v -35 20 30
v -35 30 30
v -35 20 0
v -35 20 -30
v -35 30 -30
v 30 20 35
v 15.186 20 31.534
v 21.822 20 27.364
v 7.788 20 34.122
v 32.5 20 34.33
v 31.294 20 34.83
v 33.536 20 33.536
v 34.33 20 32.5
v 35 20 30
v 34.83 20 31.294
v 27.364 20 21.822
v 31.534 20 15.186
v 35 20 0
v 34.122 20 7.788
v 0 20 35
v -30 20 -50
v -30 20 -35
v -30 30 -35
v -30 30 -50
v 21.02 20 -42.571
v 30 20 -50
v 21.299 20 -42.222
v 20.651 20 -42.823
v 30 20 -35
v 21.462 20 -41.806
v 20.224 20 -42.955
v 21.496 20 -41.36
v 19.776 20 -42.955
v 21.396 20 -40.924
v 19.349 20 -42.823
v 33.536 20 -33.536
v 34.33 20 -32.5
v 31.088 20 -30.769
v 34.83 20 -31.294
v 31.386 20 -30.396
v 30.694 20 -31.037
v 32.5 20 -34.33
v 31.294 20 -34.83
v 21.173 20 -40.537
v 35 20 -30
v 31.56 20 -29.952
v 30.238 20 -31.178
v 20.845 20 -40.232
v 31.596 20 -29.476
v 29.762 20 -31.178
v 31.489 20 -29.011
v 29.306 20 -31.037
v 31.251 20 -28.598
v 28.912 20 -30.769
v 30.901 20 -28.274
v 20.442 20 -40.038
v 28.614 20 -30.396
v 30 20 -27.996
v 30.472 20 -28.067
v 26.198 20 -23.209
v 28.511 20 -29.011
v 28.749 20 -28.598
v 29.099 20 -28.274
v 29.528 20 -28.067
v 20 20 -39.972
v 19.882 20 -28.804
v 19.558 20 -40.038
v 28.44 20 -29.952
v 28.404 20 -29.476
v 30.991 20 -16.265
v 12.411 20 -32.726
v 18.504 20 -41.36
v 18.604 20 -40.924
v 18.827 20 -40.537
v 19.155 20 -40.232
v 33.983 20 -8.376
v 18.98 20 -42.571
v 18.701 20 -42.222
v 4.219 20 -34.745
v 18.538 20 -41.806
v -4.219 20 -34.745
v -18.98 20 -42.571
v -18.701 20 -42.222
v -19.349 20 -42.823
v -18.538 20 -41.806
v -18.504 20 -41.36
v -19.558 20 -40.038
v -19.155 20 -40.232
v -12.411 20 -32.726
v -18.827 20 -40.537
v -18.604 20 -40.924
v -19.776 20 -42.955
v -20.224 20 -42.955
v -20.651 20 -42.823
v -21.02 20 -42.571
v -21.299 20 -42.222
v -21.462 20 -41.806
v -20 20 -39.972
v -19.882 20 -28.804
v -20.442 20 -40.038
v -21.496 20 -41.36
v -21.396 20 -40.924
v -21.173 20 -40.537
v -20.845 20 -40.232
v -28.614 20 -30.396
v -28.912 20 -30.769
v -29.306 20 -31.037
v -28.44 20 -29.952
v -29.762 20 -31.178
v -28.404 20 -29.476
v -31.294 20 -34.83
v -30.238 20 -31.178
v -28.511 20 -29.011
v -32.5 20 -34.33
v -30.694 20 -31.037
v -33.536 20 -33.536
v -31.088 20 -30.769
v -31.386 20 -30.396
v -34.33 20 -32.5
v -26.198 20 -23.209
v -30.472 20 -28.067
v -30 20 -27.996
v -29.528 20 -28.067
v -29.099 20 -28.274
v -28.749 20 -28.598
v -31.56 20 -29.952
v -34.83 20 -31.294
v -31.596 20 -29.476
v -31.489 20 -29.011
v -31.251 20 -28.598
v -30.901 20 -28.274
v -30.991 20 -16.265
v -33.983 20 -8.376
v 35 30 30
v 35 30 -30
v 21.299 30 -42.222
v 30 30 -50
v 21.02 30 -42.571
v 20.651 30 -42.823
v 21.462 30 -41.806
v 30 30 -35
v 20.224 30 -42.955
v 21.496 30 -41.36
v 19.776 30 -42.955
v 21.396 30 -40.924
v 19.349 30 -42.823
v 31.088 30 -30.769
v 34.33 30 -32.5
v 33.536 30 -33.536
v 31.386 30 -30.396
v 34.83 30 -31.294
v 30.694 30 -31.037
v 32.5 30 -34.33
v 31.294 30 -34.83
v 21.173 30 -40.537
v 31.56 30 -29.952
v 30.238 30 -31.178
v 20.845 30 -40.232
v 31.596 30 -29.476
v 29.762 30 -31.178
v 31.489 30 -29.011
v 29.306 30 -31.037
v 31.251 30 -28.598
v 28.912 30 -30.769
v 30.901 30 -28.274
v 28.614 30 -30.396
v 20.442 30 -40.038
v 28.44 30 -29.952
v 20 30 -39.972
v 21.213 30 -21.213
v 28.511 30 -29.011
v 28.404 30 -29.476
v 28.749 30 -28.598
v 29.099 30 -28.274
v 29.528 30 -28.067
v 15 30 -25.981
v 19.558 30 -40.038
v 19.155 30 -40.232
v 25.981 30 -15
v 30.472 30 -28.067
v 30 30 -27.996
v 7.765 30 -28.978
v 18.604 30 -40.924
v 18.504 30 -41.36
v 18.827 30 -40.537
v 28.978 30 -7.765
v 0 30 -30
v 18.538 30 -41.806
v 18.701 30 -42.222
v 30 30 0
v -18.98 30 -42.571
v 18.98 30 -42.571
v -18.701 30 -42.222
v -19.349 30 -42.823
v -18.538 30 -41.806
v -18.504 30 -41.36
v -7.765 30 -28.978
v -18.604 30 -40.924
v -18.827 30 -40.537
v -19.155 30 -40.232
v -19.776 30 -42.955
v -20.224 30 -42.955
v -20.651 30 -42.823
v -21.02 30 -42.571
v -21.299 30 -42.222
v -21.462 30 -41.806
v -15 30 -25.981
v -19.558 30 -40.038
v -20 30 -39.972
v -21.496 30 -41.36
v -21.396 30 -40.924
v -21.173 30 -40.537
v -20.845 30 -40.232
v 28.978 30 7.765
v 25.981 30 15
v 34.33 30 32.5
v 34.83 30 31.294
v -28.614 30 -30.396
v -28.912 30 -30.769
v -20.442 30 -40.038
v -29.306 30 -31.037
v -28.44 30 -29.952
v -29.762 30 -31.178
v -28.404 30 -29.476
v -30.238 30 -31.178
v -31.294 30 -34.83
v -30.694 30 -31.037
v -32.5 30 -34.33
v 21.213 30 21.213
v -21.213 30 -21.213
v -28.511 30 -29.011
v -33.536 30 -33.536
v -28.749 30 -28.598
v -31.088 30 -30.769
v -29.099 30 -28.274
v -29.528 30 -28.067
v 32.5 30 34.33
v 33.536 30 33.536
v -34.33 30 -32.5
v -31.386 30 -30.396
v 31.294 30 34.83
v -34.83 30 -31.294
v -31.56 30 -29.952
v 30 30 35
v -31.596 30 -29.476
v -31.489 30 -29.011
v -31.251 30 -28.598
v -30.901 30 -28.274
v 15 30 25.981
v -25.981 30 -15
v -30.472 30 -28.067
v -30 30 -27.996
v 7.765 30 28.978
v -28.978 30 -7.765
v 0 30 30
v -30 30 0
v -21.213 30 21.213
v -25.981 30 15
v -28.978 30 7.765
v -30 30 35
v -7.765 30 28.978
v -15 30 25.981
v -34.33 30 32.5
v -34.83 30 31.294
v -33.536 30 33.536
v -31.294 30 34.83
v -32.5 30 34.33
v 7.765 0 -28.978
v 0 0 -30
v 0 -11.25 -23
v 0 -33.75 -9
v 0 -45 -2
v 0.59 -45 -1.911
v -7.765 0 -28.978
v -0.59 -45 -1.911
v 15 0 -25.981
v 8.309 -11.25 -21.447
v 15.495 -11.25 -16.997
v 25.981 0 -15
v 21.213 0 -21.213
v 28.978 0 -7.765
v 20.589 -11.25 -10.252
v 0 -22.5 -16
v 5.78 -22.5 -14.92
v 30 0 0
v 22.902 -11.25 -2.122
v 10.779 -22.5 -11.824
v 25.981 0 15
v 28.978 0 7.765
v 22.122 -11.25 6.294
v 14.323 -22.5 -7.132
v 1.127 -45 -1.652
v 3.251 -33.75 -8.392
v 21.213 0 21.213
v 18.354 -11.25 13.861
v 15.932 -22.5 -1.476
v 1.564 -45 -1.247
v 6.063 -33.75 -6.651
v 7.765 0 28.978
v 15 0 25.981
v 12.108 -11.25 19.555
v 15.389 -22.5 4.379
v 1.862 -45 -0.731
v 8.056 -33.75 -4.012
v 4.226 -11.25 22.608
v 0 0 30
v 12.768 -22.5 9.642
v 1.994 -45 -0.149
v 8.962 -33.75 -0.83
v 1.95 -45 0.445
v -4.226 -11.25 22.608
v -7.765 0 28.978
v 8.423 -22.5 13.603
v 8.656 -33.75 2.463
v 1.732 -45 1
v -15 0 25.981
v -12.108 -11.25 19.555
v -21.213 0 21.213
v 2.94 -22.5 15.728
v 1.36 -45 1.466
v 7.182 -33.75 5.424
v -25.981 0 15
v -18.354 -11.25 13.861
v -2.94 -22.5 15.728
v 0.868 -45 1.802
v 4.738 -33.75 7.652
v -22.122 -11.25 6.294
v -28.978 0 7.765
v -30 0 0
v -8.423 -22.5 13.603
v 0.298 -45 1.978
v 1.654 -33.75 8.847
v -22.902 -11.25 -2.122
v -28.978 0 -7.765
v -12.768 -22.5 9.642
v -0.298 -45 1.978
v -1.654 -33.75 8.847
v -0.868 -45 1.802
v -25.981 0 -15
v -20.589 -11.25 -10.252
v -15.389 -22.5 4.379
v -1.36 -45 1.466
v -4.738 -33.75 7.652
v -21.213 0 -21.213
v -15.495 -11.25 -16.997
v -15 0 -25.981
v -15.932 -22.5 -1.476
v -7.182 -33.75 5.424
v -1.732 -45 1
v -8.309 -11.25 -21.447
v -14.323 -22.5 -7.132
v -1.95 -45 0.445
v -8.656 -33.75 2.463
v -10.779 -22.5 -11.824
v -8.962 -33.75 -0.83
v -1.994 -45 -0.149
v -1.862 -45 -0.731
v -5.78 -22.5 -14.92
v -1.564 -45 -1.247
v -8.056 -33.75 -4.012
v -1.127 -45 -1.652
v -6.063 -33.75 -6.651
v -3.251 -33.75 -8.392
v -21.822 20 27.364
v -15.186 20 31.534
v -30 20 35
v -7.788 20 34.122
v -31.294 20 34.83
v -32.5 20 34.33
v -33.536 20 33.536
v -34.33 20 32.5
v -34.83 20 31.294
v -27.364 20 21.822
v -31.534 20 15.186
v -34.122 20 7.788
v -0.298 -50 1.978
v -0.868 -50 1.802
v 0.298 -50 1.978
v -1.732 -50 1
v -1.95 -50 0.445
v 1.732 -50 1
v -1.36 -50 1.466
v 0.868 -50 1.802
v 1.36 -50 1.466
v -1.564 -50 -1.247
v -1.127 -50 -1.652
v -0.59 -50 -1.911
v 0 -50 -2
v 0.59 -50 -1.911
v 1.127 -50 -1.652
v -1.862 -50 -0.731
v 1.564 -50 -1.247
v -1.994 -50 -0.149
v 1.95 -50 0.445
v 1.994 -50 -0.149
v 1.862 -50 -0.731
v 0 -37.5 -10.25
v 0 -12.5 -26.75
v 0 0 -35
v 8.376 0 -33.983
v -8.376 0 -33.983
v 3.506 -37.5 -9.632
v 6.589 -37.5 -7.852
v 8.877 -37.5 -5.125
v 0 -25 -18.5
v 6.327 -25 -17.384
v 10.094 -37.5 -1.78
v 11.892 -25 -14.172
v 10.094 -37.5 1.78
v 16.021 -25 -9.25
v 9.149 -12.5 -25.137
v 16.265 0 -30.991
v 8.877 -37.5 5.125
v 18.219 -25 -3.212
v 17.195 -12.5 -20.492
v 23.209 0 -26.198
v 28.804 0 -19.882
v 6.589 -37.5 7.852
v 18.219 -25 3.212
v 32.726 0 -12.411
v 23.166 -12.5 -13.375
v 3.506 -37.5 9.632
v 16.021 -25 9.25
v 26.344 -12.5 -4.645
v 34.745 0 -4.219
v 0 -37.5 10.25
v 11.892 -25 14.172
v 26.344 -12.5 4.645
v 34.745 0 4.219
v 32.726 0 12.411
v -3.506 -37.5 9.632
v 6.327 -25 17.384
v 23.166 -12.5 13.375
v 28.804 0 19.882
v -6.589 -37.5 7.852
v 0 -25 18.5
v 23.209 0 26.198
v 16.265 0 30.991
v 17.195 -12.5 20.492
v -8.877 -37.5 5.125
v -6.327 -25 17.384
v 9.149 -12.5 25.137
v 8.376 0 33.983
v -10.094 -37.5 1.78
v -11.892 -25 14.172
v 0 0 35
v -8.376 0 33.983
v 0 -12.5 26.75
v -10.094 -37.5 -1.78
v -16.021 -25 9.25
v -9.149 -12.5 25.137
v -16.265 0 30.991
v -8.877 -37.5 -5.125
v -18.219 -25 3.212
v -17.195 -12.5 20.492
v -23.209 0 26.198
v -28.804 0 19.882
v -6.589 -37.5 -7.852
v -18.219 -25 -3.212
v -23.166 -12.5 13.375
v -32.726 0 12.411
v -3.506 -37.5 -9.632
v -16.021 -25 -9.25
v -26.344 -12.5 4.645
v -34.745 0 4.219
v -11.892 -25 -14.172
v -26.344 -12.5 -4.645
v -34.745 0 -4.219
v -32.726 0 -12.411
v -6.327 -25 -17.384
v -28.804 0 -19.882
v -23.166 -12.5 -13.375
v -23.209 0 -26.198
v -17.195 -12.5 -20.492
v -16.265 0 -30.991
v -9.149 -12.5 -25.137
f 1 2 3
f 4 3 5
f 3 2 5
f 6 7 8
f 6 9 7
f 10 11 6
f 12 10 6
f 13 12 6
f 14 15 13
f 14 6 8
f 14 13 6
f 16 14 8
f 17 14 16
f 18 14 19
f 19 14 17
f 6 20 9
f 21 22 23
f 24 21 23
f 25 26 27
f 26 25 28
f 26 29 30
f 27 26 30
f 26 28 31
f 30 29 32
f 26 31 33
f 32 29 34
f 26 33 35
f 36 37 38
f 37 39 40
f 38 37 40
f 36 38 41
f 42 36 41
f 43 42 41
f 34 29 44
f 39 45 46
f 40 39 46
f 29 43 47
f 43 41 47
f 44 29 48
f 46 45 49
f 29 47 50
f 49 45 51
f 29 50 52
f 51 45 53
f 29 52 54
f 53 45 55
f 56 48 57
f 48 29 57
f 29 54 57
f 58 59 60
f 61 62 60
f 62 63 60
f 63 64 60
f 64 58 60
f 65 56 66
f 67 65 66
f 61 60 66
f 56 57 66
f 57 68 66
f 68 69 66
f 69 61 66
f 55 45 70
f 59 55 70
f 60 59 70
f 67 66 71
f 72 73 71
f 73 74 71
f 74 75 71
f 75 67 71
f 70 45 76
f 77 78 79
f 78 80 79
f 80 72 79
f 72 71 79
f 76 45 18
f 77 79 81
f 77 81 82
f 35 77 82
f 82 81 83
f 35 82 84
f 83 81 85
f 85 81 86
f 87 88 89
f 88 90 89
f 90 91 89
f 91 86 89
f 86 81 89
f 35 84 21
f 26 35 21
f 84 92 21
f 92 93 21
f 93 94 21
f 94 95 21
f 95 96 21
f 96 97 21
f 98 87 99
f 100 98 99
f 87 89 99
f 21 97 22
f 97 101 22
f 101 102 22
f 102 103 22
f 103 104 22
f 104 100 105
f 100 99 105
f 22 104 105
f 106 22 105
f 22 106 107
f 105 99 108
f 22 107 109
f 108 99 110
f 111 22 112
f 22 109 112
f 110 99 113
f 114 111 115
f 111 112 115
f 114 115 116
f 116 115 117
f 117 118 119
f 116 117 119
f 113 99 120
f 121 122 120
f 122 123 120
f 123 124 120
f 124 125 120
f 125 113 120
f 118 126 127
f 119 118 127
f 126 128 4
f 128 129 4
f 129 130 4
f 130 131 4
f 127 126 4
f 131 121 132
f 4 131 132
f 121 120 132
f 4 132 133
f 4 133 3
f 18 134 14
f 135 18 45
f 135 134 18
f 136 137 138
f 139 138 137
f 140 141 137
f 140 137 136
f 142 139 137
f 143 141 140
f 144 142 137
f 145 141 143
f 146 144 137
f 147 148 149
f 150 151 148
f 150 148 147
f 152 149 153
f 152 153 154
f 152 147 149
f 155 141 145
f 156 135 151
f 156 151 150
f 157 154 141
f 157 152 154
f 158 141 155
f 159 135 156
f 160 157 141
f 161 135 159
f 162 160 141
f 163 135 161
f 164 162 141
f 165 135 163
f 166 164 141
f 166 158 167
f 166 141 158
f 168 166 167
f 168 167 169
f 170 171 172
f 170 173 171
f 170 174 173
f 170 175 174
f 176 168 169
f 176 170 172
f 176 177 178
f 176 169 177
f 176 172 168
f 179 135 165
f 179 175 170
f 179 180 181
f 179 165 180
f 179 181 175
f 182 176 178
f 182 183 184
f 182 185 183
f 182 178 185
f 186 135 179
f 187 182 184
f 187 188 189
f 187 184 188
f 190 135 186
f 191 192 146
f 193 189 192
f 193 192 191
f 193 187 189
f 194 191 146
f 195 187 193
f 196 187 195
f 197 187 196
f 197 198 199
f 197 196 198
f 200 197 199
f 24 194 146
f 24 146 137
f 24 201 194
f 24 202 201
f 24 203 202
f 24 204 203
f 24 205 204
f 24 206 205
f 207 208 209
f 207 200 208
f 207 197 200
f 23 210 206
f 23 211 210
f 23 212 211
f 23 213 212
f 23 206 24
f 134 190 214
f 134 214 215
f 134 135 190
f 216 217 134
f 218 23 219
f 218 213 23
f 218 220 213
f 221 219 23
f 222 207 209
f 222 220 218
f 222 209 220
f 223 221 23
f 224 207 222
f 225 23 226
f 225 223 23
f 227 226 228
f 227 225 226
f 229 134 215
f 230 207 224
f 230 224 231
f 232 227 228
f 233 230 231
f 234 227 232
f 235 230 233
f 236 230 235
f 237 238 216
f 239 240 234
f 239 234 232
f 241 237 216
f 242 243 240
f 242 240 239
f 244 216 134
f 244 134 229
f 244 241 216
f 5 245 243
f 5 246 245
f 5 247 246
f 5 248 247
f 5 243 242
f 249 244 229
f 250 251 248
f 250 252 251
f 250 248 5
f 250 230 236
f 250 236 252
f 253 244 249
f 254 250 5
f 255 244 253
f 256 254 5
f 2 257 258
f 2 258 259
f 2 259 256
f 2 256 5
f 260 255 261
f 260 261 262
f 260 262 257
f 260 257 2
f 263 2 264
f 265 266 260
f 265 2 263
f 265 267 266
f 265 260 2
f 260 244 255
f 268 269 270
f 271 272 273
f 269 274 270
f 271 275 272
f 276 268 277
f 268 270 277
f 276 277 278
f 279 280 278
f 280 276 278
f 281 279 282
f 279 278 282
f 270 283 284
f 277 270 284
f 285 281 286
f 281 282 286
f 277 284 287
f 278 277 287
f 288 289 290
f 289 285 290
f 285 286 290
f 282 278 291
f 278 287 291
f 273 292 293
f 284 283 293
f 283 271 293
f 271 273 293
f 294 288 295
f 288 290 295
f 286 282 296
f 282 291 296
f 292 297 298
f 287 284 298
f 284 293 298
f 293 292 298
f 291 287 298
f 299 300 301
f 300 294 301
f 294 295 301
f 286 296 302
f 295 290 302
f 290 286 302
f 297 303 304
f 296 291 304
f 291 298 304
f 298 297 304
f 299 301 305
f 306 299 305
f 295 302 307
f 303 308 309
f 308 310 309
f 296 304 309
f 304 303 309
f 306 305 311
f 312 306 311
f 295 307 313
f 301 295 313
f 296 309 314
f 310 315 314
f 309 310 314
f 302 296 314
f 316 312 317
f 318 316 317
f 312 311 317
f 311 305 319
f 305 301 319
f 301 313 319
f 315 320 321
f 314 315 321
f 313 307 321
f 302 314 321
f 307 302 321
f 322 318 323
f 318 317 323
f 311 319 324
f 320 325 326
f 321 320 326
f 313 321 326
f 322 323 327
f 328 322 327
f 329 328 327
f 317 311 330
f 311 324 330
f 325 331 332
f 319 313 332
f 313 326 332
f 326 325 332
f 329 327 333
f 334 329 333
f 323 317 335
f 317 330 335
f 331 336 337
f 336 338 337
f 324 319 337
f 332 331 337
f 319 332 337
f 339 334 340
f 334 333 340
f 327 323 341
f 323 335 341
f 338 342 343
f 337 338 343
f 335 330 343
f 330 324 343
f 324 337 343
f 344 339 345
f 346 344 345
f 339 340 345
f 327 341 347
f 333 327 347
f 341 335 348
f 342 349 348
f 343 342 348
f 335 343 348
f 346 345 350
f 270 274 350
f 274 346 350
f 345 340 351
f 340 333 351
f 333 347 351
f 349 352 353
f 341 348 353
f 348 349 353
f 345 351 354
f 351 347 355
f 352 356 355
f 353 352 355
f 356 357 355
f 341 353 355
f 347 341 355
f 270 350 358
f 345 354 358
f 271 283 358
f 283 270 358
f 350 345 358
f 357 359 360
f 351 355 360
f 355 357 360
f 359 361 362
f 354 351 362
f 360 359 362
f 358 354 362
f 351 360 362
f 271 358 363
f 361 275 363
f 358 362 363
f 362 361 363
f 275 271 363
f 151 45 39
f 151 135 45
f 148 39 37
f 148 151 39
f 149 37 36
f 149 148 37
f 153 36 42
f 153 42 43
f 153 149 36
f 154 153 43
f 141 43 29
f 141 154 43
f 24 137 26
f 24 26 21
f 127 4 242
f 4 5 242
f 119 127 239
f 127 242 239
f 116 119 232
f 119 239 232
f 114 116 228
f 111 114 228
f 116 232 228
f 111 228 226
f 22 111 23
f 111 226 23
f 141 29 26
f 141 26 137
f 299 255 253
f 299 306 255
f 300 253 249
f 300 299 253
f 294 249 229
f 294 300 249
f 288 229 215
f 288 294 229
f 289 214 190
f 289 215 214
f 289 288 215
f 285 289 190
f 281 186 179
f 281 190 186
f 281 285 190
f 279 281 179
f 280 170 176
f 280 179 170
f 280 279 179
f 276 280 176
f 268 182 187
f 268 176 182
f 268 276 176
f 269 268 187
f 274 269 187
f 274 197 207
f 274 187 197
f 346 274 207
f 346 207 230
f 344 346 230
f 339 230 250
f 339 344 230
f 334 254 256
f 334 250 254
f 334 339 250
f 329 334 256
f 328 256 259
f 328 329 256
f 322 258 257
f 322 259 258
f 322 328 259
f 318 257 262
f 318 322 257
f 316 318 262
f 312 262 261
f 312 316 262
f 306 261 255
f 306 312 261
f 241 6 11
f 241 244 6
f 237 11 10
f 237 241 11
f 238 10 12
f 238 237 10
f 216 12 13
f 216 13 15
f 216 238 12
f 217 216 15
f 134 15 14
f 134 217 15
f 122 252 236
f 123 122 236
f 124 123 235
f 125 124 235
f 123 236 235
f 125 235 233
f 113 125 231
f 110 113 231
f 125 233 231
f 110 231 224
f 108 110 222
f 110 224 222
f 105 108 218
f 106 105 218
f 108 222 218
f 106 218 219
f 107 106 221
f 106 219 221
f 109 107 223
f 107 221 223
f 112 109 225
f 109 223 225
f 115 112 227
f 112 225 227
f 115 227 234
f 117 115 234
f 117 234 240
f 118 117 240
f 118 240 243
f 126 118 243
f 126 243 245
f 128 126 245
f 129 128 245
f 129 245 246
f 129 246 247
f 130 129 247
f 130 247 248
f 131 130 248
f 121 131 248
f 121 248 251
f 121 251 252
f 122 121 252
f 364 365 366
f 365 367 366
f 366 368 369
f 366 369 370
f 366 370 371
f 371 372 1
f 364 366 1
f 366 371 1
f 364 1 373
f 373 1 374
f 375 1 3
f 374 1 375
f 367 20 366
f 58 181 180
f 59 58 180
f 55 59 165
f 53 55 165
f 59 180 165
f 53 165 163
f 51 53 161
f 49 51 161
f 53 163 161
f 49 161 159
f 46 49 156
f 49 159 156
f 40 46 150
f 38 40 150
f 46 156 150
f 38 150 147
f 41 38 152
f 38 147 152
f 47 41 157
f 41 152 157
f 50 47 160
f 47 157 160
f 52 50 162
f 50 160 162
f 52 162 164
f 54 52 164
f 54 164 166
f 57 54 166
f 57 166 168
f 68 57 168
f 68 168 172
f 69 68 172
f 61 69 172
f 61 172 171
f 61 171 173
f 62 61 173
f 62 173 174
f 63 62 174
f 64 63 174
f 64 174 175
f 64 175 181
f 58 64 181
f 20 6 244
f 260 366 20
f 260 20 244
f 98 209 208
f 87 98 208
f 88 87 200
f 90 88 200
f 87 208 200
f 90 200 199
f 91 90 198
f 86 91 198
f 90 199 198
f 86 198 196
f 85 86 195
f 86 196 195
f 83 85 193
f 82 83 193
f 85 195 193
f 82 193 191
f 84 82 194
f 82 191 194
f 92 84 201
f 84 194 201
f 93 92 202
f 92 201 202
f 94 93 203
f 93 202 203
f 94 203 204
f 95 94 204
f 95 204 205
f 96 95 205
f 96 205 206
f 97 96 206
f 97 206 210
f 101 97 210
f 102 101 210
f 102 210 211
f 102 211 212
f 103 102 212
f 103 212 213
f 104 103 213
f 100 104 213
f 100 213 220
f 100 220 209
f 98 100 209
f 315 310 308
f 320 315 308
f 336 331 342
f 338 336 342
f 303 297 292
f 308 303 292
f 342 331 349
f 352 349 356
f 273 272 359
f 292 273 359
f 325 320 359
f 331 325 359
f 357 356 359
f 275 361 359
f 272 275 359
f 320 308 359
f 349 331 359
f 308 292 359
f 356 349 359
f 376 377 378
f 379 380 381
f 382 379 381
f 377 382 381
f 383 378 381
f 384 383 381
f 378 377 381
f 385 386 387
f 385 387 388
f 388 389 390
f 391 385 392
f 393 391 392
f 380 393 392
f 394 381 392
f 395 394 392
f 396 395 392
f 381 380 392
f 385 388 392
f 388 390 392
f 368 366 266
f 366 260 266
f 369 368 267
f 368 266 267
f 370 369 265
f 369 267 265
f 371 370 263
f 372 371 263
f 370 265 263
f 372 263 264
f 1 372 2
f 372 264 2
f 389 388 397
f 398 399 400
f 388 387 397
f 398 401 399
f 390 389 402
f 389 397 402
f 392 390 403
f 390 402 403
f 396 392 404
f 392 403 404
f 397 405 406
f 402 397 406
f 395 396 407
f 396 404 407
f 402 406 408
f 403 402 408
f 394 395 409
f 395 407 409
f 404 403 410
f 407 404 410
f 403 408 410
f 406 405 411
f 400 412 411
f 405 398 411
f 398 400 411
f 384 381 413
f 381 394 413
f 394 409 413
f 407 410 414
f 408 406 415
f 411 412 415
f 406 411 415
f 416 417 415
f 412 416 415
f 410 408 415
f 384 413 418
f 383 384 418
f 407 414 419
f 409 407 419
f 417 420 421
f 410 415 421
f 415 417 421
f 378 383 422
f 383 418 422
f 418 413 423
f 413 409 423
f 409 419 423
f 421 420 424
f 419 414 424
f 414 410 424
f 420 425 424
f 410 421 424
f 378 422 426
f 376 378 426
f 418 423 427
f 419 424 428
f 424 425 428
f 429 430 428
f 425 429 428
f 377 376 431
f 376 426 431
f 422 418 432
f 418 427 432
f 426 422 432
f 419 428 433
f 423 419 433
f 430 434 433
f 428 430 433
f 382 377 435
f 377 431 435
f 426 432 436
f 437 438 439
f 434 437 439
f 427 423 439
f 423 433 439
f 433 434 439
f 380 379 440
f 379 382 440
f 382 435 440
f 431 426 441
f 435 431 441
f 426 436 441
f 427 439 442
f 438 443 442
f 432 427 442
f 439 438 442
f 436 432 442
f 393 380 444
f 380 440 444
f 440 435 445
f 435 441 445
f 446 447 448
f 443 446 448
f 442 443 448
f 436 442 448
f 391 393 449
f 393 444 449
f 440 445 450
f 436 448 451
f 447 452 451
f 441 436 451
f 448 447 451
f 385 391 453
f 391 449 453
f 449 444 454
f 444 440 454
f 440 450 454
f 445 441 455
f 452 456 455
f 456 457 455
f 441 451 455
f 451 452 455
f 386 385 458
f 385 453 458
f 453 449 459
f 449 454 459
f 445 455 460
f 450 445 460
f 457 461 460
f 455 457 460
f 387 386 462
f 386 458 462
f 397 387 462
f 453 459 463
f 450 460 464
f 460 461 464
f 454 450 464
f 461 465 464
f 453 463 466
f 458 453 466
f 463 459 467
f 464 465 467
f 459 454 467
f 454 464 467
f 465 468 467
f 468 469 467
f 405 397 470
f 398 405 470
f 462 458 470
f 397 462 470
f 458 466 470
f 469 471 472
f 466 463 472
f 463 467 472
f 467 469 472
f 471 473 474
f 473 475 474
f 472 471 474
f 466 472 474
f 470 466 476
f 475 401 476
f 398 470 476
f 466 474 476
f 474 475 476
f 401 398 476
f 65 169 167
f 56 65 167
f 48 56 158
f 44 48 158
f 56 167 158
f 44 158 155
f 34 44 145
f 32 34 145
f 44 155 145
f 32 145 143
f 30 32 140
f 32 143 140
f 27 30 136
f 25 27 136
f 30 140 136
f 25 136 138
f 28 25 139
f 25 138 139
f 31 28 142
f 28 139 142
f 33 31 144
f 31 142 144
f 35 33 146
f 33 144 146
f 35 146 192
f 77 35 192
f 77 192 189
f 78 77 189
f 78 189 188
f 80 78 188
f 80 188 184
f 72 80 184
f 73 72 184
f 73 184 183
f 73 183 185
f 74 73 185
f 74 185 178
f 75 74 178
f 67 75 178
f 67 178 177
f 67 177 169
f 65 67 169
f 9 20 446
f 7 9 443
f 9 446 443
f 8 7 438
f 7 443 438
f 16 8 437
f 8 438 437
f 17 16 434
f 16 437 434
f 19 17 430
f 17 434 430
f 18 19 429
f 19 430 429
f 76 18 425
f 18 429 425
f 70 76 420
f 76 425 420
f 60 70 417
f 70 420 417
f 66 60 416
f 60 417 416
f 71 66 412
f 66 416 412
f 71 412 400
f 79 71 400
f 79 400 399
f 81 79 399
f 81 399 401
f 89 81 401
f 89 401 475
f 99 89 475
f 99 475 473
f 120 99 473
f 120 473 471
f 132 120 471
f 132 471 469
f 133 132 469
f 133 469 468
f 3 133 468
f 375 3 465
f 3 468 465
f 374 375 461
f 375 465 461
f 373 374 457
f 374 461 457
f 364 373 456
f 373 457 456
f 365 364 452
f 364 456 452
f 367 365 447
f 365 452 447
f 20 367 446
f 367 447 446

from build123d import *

# Parameters (mm, degrees)
SKETCH1_R                = 35
SKETCH1_R_2              = 30
BOSS_EXTRUDE1_DEPTH      = 30
BOSS_EXTRUDE2_REACH      = 94.871
BOSS_EXTRUDE2_END_RADIUS = 35
SKETCH4_W                = 70
SKETCH4_H                = 10
SKETCH5_R                = 1.6
CUT_EXTRUDE1_DEPTH       = 95.074438611
FILLET1_R                = 5
SKETCH7_W                = 60
SKETCH7_H                = 10
BOSS_EXTRUDE3_DEPTH      = 15
SKETCH6_R                = 1.5
CUT_EXTRUDE2_DEPTH       = 15


# Read off the part's stored shape, not the designer's step: Split2
with BuildPart() as part:
    # Sketch1 → Boss-Extrude1 (new body)
    with BuildSketch(Plane(origin=(0, 0, 0), x_dir=(1, 0, 0), z_dir=(0, 1, 0))):
        with Locations(Location((0, 0, 0), (0, 0, 270))):
            Circle(SKETCH1_R)
        with Locations(Location((0, 0, 0), (0, 0, 270))):
            Circle(SKETCH1_R_2, mode=Mode.SUBTRACT)
    extrude(amount=BOSS_EXTRUDE1_DEPTH)

    # Sketch3 → Revolve1 (revolve)
    with BuildSketch(Plane.XY, mode=Mode.PRIVATE) as revolve1_sk:
        Polygon((2, -50), (35, 0), (30, 0), (2, -45), (0, -45), (0, -50), align=None)
    revolve(revolve1_sk.sketch.rotate(Axis((0, 0, 0), (0, -1, 0)), 180), axis=Axis((0, 0, 0), (0, -1, 0)))


with BuildPart() as body_2:
    # Split1: the piece on the far side of the plane
    add(part.part)
    split(bisect_by=Plane(origin=(0, 0, 0), x_dir=(0, 0, 1), z_dir=(1, 0, 0)), keep=Keep.BOTTOM)


with BuildPart() as part_1:
    add(part.part)

    # Split1
    split(bisect_by=Plane(origin=(0, 0, 0), x_dir=(0, 0, 1), z_dir=(1, 0, 0)), keep=Keep.TOP)

    add(body_2.part)  # Boss-Extrude2 merges body 2
    # Boss-Extrude2: up to this cylinder (the profile starts outside it)
    boss_extrude2_end = Plane(origin=(0, 25, 0), z_dir=(0, -1, 0)) * Cylinder(BOSS_EXTRUDE2_END_RADIUS, 260.742, mode=Mode.PRIVATE)
    # Sketch4 → Boss-Extrude2 (add, up to the surface)
    with BuildSketch(Plane(origin=(35, 0, 0), x_dir=(0, 0, -1), z_dir=(1, 0, 0)), mode=Mode.PRIVATE) as boss_extrude2_sk1:
        with Locations((0, 25)):
            Rectangle(SKETCH4_W, SKETCH4_H)
    boss_extrude2_tool1 = extrude(boss_extrude2_sk1.sketch, amount=-BOSS_EXTRUDE2_REACH, mode=Mode.PRIVATE) - boss_extrude2_end
    boss_extrude2 = boss_extrude2_tool1.solids().sort_by_distance((35, 25, 0))[0] + boss_extrude2_tool1.solids().sort_by_distance((35, 25, 0))[1]
    add(boss_extrude2)

    # Mirror1: Boss-Extrude2 across plane
    add(boss_extrude2.mirror(Plane(origin=(0, 0, 0), x_dir=(0, 0, 1), z_dir=(1, 0, 0))))

    # Sketch5 → Cut-Extrude1 (cut, through all)
    with BuildSketch(Plane(origin=(0, 30, 0), x_dir=(1, 0, 0), z_dir=(0, 1, 0))):
        with Locations(Location((-30, 29.59590276, 0), (0, 0, 270))):
            Circle(SKETCH5_R)
        with Locations(Location((30, 29.59590276, 0), (0, 0, 270))):
            Circle(SKETCH5_R)
    extrude(amount=-CUT_EXTRUDE1_DEPTH, mode=Mode.SUBTRACT)

    # Fillet1
    fillet1_edges = [part_1.edges().sort_by_distance(p)[0] for p in [
        (35, 25, -35),
        (35, 25, 35),
        (-35, 25, 35),
        (-35, 25, -35),
    ]]
    fillet(fillet1_edges, radius=FILLET1_R)


with BuildPart() as body_2_2:
    # Split2: the piece on the far side of the plane
    add(part_1.part)
    split(bisect_by=Plane.YZ, keep=Keep.BOTTOM)


with BuildPart() as part_2:
    add(part_1.part)

    # Split2
    split(bisect_by=Plane.YZ, keep=Keep.TOP)

    add(body_2_2.part)  # Boss-Extrude3 merges body 2 2
    # Sketch7 → Boss-Extrude3 (add)
    with BuildSketch(Plane(origin=(0, 0, -35), x_dir=(-1, 0, 0), z_dir=(0, 0, -1))):
        with Locations((0, 25)):
            Rectangle(SKETCH7_W, SKETCH7_H)
    extrude(amount=BOSS_EXTRUDE3_DEPTH)

    # Sketch6 → Cut-Extrude2 (cut)
    with BuildSketch(Plane(origin=(0, 30, 0), x_dir=(1, 0, 0), z_dir=(0, 1, 0))):
        with Locations(Location((-20, 41.471784691, 0), (0, 0, 270))):
            Circle(SKETCH6_R)
        with Locations(Location((20, 41.471784691, 0), (0, 0, 270))):
            Circle(SKETCH6_R)
    extrude(amount=-CUT_EXTRUDE2_DEPTH, mode=Mode.SUBTRACT)


solid = part_2.part
